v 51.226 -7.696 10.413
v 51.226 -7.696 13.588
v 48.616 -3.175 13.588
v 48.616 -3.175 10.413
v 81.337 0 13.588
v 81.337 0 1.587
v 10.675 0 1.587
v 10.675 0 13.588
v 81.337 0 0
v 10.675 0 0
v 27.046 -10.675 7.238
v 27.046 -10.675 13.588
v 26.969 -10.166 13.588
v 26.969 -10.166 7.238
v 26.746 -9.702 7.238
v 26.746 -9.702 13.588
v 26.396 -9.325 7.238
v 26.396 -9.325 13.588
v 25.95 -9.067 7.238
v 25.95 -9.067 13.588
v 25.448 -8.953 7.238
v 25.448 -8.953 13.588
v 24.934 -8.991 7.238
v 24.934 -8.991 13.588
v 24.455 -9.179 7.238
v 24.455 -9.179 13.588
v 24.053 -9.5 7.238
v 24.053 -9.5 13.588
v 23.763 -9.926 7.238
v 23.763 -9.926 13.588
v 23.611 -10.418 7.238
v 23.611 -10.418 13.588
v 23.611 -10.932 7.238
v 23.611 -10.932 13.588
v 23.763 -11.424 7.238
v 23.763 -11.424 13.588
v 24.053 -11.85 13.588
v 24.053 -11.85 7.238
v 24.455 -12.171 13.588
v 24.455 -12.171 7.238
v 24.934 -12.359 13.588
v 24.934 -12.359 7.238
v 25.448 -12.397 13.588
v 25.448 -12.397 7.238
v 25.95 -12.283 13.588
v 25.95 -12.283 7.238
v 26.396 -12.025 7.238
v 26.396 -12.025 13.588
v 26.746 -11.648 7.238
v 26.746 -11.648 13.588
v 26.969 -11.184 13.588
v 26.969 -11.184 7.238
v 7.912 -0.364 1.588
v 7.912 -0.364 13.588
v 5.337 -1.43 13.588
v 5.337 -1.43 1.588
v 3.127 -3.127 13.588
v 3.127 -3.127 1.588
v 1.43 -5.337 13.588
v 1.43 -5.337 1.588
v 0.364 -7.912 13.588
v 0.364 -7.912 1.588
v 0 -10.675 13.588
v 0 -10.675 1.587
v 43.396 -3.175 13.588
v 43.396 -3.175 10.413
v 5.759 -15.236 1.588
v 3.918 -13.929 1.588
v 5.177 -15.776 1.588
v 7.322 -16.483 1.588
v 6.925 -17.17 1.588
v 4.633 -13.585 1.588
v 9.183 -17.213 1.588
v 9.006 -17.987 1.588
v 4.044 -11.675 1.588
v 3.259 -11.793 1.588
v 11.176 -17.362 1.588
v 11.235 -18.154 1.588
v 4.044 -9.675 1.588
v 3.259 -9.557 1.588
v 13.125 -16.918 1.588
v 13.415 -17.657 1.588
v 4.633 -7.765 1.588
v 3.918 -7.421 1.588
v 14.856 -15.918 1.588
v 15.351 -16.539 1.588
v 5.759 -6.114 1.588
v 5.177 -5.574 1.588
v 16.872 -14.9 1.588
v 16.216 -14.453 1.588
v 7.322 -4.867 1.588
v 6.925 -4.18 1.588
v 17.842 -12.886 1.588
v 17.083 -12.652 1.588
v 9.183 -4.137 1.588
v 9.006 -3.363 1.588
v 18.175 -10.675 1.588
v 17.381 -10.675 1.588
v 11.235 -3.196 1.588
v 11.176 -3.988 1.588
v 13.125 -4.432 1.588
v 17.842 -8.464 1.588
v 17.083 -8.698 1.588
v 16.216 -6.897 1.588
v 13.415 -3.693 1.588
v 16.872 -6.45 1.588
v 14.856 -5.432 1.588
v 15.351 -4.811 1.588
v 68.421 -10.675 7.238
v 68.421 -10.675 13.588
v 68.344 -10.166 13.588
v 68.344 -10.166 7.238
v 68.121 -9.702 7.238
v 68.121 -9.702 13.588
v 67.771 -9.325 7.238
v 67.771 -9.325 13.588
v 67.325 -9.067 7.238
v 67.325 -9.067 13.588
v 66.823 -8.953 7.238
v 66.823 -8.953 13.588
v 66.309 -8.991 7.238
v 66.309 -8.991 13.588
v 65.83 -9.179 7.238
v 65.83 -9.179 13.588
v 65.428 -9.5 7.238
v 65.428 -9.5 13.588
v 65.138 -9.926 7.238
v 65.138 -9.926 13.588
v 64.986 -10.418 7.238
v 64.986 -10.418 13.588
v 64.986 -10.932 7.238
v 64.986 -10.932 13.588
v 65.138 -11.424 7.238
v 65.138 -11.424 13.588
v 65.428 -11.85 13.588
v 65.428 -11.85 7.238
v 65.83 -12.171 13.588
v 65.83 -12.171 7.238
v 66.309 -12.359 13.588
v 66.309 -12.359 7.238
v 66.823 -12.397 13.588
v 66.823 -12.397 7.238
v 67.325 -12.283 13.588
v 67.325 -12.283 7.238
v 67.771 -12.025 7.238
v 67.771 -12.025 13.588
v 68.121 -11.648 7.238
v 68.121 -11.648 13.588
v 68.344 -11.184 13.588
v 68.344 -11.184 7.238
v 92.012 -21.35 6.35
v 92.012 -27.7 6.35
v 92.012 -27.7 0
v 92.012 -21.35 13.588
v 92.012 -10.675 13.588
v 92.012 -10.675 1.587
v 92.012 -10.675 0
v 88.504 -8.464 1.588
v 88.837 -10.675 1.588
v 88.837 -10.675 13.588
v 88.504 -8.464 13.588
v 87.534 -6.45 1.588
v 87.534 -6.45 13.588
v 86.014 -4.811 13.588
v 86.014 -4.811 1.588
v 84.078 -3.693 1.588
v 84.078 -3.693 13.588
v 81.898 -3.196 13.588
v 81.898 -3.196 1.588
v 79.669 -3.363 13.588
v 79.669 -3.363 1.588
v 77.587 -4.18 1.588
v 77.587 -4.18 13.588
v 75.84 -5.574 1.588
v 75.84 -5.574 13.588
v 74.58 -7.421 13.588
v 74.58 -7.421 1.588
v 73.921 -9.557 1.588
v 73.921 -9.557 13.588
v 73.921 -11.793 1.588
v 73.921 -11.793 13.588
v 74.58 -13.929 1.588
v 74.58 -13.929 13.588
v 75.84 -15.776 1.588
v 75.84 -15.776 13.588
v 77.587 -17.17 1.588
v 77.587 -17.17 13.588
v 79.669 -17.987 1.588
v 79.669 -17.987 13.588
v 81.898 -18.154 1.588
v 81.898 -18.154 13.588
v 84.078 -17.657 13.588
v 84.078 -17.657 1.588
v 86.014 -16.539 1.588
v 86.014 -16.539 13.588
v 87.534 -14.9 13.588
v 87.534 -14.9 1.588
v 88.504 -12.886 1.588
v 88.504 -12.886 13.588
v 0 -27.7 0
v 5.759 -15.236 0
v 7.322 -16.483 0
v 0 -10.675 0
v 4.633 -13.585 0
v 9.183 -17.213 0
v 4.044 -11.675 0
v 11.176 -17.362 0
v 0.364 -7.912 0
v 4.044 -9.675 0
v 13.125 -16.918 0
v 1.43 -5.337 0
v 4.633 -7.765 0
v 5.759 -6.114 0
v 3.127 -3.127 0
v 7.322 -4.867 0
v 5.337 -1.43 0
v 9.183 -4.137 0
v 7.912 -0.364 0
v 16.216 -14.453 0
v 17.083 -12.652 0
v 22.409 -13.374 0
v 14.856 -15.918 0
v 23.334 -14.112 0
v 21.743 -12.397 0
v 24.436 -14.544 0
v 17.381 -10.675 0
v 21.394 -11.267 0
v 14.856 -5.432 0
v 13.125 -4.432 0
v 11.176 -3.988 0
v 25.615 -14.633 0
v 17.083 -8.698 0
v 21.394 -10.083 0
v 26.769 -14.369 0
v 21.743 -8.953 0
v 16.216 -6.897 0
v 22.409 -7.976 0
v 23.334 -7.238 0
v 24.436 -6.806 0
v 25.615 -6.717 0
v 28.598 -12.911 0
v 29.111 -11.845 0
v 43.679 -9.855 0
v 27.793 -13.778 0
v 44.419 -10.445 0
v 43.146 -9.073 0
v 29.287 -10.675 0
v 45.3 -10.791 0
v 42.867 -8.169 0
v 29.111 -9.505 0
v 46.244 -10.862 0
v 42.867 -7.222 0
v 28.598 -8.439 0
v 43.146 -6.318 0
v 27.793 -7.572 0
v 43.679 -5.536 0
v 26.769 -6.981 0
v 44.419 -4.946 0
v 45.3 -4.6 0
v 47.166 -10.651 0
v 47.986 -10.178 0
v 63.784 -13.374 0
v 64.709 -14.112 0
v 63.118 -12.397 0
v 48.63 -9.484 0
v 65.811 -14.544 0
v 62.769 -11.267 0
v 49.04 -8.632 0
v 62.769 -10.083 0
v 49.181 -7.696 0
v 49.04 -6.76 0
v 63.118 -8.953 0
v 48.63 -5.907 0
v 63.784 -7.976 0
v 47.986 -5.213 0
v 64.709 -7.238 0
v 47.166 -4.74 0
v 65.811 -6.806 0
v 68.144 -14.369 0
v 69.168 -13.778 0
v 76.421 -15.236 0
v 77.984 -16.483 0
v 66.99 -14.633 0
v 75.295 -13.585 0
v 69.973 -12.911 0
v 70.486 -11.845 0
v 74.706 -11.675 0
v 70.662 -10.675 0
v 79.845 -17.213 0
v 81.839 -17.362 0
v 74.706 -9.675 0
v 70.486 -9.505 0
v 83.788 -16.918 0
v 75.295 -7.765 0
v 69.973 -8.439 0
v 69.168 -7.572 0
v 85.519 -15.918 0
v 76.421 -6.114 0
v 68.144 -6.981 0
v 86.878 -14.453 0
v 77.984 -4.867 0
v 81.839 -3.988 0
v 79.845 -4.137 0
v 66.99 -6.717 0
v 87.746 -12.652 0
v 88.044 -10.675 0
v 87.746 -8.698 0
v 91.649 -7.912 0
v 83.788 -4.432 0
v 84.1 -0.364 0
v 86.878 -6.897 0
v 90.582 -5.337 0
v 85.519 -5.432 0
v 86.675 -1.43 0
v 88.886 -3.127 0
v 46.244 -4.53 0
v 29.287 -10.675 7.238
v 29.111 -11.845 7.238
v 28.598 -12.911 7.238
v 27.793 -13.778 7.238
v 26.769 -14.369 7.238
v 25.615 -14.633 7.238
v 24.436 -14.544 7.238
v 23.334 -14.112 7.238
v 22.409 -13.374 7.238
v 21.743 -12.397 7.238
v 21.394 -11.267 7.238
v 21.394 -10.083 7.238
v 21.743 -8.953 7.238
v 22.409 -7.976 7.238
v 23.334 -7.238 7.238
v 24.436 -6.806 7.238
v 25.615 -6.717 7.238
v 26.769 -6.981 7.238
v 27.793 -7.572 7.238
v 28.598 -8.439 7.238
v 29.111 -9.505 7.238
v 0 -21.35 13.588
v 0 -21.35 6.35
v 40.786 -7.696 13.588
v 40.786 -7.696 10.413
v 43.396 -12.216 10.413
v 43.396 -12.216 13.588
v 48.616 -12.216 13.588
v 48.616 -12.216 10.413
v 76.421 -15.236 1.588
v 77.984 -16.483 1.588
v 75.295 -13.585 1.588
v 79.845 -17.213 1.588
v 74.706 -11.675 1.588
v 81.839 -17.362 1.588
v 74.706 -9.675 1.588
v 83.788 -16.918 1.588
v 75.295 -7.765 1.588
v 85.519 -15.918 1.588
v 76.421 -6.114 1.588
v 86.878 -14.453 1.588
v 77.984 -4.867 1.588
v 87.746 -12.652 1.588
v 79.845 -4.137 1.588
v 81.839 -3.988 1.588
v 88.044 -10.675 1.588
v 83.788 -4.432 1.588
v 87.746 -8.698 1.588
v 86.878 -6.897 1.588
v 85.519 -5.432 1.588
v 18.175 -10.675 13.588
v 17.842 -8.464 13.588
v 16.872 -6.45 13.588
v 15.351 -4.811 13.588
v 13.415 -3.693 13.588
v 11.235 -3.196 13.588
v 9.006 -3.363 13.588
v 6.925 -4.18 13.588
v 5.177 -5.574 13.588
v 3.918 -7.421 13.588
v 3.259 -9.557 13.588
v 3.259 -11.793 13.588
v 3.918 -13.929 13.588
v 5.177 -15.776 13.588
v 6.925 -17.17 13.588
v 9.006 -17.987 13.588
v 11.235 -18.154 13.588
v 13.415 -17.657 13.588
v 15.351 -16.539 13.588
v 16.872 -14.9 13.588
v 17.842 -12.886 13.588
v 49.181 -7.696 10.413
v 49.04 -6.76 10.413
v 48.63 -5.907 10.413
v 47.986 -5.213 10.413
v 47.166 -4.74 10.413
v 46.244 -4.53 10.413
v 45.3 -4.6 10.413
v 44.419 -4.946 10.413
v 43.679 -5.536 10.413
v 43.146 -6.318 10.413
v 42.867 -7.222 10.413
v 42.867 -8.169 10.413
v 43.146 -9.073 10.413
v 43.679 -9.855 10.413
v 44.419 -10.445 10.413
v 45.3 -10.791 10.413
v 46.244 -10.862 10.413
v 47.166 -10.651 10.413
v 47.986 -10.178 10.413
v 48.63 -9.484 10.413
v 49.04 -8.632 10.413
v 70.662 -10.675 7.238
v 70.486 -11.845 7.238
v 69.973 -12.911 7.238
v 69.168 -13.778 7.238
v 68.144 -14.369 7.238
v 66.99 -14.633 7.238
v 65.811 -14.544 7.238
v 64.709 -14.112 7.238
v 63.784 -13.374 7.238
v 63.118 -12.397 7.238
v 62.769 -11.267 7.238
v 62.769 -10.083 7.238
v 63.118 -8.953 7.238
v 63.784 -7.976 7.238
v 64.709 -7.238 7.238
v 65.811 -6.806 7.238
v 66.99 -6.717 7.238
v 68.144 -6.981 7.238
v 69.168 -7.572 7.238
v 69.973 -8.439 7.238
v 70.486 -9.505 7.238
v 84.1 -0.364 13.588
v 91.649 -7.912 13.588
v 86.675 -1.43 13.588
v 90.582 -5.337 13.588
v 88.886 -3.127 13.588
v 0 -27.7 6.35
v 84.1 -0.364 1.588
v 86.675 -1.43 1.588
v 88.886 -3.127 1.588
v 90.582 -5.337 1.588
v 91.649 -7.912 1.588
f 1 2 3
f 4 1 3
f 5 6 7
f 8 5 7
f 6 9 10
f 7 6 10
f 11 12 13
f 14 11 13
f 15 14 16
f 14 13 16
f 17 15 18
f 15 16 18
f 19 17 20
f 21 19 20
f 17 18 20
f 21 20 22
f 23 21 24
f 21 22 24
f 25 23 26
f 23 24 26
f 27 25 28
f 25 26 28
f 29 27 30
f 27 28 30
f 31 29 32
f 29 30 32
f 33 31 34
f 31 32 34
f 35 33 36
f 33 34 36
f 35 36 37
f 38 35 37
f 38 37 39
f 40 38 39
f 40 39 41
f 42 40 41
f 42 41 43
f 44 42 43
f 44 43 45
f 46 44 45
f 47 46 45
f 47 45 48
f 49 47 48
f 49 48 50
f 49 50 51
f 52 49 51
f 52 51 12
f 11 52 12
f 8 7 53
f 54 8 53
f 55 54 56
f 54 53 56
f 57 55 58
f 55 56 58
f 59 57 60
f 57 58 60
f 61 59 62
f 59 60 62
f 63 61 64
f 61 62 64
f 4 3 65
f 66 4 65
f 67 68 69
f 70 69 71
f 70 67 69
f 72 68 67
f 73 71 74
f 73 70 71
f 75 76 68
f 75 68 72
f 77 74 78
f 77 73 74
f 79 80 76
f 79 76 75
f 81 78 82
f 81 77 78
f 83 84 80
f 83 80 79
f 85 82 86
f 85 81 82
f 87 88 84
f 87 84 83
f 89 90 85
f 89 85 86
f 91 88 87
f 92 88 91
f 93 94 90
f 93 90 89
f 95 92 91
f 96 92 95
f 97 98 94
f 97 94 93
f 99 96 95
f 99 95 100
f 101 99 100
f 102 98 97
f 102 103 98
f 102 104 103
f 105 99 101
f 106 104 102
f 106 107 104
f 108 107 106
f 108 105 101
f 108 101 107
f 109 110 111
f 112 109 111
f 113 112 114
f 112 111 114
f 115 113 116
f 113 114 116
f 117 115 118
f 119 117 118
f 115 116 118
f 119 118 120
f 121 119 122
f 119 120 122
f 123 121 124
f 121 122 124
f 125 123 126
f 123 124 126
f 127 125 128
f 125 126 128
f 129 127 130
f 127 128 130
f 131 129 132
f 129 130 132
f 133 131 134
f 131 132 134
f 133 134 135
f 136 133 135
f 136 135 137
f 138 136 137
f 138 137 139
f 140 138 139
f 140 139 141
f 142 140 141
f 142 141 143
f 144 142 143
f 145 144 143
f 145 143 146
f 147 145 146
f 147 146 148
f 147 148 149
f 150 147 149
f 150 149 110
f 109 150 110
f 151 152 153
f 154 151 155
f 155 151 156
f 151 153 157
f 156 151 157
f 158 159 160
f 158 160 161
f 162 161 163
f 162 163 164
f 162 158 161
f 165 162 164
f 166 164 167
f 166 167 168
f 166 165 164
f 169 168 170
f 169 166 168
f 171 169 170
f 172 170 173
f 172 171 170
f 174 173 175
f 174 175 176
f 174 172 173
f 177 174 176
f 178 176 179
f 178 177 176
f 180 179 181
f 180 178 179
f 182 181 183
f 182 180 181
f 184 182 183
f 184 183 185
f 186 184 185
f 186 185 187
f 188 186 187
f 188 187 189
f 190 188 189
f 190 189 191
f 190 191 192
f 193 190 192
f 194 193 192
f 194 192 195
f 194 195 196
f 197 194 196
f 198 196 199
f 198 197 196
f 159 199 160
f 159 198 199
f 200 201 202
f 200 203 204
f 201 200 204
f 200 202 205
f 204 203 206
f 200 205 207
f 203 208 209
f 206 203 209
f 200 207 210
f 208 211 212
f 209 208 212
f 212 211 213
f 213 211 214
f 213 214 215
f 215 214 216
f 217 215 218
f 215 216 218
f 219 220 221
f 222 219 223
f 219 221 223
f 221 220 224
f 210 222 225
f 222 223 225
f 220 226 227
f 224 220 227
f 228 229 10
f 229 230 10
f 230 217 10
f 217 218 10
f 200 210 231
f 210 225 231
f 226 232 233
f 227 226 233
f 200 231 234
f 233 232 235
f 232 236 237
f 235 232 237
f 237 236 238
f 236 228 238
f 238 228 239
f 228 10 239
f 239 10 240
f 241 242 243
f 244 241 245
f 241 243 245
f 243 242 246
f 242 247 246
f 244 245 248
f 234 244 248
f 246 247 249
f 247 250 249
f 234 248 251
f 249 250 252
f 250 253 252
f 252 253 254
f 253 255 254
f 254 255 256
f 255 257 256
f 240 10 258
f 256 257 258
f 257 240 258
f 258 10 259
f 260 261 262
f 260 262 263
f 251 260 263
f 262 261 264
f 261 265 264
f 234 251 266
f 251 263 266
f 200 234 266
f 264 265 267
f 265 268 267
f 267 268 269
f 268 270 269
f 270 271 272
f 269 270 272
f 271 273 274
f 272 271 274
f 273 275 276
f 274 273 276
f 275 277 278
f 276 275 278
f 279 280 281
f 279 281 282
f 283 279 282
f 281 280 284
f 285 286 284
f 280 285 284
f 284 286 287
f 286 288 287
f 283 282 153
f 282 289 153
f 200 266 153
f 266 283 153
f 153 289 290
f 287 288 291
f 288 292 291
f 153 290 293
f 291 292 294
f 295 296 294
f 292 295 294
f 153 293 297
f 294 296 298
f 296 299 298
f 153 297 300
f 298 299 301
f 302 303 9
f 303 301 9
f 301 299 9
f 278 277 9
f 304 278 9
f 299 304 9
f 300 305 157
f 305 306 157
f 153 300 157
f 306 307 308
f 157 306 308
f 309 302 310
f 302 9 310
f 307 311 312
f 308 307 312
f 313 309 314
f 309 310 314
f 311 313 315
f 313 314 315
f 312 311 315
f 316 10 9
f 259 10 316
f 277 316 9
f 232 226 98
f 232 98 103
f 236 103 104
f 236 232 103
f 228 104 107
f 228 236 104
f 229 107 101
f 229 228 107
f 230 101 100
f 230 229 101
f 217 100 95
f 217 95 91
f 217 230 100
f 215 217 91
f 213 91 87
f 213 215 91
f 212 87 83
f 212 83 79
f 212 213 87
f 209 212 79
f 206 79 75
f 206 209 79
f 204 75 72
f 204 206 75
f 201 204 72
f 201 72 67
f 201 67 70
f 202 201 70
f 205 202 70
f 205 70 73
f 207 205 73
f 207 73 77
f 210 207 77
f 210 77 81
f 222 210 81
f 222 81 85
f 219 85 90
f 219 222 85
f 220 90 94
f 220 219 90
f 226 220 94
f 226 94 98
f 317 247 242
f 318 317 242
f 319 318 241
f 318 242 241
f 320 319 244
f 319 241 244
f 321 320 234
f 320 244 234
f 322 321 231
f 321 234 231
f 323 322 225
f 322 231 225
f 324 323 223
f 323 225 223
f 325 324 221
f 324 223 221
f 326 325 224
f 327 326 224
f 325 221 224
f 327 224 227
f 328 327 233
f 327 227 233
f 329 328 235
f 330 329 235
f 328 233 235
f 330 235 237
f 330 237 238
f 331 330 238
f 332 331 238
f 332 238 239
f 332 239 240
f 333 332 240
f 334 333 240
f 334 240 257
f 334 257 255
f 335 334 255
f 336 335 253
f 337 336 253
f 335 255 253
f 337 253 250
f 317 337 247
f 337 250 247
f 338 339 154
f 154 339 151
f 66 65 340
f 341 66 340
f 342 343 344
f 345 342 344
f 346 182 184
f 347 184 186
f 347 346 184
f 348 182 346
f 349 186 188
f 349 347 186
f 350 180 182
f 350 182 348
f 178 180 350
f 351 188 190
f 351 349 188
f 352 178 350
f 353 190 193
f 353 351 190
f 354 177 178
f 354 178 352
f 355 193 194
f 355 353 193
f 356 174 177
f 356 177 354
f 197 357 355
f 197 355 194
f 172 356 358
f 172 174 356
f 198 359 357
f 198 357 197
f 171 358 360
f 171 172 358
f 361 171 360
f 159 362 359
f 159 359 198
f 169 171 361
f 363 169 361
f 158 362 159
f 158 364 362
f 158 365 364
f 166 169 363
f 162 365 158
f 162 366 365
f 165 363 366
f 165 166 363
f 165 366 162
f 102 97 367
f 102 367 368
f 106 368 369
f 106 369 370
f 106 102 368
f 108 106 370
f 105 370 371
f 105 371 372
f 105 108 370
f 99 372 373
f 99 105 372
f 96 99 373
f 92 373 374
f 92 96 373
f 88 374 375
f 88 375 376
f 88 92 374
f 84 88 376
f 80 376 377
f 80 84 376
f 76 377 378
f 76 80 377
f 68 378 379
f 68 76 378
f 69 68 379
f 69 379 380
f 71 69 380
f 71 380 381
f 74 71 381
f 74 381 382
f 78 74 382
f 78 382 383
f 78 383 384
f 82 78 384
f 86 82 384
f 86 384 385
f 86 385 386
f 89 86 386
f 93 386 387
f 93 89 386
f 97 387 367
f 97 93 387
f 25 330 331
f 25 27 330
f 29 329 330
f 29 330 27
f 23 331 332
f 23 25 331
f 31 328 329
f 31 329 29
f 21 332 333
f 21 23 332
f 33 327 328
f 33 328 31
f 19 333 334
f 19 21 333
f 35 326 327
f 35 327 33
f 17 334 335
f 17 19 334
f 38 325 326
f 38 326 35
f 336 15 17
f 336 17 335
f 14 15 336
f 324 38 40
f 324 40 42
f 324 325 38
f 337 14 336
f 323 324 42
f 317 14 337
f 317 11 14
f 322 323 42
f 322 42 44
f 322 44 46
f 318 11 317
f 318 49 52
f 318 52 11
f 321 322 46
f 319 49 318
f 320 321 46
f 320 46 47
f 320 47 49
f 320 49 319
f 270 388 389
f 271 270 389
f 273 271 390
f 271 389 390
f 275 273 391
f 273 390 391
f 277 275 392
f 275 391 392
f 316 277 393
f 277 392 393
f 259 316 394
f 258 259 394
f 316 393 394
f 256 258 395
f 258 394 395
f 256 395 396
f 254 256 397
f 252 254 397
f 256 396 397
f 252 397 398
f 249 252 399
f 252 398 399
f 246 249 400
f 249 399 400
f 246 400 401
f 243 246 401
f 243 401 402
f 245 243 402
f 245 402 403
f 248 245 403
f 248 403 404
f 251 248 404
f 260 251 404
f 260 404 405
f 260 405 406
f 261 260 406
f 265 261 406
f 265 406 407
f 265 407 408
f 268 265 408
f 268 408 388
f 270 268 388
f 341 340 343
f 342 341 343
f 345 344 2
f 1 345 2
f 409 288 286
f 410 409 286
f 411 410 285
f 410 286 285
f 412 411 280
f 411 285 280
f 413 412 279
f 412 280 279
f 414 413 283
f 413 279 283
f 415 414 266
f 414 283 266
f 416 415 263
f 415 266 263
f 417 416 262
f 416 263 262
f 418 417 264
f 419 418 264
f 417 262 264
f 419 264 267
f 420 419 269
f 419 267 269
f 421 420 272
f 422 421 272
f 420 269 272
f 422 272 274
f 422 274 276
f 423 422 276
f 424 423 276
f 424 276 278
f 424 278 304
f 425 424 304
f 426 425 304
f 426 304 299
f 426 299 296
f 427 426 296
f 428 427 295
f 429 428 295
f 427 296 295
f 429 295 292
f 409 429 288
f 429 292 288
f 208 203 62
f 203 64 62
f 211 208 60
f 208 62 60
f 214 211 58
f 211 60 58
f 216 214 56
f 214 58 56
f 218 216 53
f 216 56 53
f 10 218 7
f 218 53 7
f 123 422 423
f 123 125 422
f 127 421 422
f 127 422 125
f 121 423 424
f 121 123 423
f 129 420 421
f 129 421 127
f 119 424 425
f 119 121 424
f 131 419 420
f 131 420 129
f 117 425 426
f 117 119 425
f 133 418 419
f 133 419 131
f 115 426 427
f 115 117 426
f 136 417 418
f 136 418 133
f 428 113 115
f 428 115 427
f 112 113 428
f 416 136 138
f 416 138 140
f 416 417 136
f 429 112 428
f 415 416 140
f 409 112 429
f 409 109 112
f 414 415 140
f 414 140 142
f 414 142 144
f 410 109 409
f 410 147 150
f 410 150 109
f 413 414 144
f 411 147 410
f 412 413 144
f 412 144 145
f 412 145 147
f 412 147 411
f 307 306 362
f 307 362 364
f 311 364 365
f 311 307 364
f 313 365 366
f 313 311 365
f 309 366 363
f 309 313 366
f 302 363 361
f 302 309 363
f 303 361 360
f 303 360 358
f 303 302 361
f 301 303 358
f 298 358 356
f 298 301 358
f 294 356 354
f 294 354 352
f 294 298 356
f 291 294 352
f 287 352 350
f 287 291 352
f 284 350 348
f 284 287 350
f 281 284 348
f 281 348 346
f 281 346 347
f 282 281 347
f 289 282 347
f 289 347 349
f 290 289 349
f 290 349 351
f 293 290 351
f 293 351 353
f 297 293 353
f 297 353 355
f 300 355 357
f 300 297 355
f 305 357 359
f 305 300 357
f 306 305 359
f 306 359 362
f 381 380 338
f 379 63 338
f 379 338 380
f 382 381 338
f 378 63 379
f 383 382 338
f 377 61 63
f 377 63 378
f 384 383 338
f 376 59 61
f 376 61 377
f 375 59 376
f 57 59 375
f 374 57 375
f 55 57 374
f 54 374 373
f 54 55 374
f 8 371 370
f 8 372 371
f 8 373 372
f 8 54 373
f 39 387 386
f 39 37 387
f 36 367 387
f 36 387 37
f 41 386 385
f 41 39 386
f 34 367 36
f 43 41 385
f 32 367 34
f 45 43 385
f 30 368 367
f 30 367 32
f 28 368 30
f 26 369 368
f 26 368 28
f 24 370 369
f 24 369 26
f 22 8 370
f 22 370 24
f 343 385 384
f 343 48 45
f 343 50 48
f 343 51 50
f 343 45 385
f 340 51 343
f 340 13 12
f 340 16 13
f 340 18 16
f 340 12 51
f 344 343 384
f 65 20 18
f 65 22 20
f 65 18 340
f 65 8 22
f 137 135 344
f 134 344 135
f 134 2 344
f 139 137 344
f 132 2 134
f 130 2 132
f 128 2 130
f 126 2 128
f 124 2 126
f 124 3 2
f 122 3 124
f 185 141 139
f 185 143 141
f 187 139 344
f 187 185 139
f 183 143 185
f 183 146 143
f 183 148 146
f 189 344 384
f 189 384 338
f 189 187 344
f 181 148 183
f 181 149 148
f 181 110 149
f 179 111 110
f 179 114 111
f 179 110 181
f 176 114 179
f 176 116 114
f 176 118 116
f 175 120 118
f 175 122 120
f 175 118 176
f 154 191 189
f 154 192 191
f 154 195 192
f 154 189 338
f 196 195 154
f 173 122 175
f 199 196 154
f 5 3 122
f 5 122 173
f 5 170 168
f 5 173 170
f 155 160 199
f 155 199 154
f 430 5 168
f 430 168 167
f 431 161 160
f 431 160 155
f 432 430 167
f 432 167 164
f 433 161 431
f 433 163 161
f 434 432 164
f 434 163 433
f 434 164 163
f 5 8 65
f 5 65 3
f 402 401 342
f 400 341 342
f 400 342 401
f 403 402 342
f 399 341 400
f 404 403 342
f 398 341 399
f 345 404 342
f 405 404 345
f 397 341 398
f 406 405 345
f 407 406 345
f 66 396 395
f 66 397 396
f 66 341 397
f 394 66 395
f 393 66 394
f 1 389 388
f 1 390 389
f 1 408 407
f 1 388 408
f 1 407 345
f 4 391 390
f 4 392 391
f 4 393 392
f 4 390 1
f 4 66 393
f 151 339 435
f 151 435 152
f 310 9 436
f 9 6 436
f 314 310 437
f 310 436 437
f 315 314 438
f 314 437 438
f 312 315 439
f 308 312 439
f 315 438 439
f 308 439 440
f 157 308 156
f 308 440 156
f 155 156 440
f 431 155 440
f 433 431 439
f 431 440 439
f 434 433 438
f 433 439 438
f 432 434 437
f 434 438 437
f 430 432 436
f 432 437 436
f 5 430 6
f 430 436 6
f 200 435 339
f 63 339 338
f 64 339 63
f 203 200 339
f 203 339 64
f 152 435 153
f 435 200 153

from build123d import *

# Parameters (mm, degrees)
F0_W      = 92.0124906
F0_H      = 27.6999954
F0_R      = 6.7062477
F1_DEPTH  = 1.5875
F2_R      = 10.6749977
F3_R      = 7.5
F4_DEPTH  = 12
F5_DEPTH  = 4.7625
F6_R      = 1.7272
F6_R_2    = 3.175
F7_DEPTH  = 13.5875
F8_R      = 3.96875
F9_DEPTH  = 7.2375014
F11_DEPTH = 3.175


with BuildPart() as f1:
    # F0 (on Top) → F1 (new body)
    with BuildSketch(Plane.XY):
        with Locations((46.0062453, -13.8499977)):
            Rectangle(F0_W, F0_H)
        with Locations((10.6749977, -10.6749977)):
            Circle(F0_R, mode=Mode.SUBTRACT)
        with Locations((81.3374929, -10.6749977)):
            Circle(F0_R, mode=Mode.SUBTRACT)
    extrude(amount=F1_DEPTH)

    # F2
    f2_edges = [f1.edges().sort_by_distance(p)[0] for p in [
        (0, 0, 0.79375),
        (92.012491, 0, 0.79375),
    ]]
    fillet(f2_edges, radius=F2_R)

    # F3 (on face) → F4 (join)
    with BuildSketch(Plane.XY.offset(1.5875)):
        with BuildLine():
            Line((0, -10.6749977), (0, -21.3499954))
            Line((0, -21.3499954), (92.0124906, -21.3499954))
            Line((92.0124906, -21.3499954), (92.0124906, -10.6749977))
            ThreePointArc((92.0124906, -10.6749977), (88.8858561628, -3.1266344372), (81.3374929, 0))
            Line((81.3374929, 0), (10.6749977, 0))
            ThreePointArc((10.6749977, 0), (3.1266344372, -3.1266344372), (0, -10.6749977))
        make_face()
        with Locations((10.6749977, -10.6749977)):
            Circle(F3_R, mode=Mode.SUBTRACT)
        with Locations((81.3374929, -10.6749977)):
            Circle(F3_R, mode=Mode.SUBTRACT)
    extrude(amount=F4_DEPTH)

    # F5 (add): a face of the model
    f5_faces = [f1.faces().sort_by_distance(p)[0] for p in [
        (46.0062453, -24.5249954, 1.5875),
    ]]
    extrude(f5_faces, amount=F5_DEPTH)

    # F6 (on face) → F7 (cut, through all)
    with BuildSketch(Plane.XY.offset(13.5875)):
        with Locations((25.3187477, -10.6749977)):
            Circle(F6_R)
        with Locations((66.6937429, -10.6749977)):
            Circle(F6_R)
        with Locations((46.0062453, -7.6956539)):
            Circle(F6_R_2)
    extrude(amount=-F7_DEPTH, mode=Mode.SUBTRACT)

    # F8 (on face) → F9 (cut)
    with BuildSketch(Plane(origin=(0, 0, 0), x_dir=(1, 0, 0), z_dir=(0, 0, -1))):
        with Locations((66.6937429, 10.6749977)):
            Circle(F8_R)
        with Locations((25.3187477, 10.6749977)):
            Circle(F8_R)
    extrude(amount=-F9_DEPTH, mode=Mode.SUBTRACT)

    # F10 (on face) → F11 (cut)
    with BuildSketch(Plane.XY.offset(13.5875)):
        Polygon((48.6162460461, -3.175), (43.3962445539, -3.175), (40.7862438078, -7.6956539), (43.3962445539, -12.2163078), (48.6162460461, -12.2163078), (51.2262467922, -7.6956539), align=None)
    extrude(amount=-F11_DEPTH, mode=Mode.SUBTRACT)


solid = f1.part
